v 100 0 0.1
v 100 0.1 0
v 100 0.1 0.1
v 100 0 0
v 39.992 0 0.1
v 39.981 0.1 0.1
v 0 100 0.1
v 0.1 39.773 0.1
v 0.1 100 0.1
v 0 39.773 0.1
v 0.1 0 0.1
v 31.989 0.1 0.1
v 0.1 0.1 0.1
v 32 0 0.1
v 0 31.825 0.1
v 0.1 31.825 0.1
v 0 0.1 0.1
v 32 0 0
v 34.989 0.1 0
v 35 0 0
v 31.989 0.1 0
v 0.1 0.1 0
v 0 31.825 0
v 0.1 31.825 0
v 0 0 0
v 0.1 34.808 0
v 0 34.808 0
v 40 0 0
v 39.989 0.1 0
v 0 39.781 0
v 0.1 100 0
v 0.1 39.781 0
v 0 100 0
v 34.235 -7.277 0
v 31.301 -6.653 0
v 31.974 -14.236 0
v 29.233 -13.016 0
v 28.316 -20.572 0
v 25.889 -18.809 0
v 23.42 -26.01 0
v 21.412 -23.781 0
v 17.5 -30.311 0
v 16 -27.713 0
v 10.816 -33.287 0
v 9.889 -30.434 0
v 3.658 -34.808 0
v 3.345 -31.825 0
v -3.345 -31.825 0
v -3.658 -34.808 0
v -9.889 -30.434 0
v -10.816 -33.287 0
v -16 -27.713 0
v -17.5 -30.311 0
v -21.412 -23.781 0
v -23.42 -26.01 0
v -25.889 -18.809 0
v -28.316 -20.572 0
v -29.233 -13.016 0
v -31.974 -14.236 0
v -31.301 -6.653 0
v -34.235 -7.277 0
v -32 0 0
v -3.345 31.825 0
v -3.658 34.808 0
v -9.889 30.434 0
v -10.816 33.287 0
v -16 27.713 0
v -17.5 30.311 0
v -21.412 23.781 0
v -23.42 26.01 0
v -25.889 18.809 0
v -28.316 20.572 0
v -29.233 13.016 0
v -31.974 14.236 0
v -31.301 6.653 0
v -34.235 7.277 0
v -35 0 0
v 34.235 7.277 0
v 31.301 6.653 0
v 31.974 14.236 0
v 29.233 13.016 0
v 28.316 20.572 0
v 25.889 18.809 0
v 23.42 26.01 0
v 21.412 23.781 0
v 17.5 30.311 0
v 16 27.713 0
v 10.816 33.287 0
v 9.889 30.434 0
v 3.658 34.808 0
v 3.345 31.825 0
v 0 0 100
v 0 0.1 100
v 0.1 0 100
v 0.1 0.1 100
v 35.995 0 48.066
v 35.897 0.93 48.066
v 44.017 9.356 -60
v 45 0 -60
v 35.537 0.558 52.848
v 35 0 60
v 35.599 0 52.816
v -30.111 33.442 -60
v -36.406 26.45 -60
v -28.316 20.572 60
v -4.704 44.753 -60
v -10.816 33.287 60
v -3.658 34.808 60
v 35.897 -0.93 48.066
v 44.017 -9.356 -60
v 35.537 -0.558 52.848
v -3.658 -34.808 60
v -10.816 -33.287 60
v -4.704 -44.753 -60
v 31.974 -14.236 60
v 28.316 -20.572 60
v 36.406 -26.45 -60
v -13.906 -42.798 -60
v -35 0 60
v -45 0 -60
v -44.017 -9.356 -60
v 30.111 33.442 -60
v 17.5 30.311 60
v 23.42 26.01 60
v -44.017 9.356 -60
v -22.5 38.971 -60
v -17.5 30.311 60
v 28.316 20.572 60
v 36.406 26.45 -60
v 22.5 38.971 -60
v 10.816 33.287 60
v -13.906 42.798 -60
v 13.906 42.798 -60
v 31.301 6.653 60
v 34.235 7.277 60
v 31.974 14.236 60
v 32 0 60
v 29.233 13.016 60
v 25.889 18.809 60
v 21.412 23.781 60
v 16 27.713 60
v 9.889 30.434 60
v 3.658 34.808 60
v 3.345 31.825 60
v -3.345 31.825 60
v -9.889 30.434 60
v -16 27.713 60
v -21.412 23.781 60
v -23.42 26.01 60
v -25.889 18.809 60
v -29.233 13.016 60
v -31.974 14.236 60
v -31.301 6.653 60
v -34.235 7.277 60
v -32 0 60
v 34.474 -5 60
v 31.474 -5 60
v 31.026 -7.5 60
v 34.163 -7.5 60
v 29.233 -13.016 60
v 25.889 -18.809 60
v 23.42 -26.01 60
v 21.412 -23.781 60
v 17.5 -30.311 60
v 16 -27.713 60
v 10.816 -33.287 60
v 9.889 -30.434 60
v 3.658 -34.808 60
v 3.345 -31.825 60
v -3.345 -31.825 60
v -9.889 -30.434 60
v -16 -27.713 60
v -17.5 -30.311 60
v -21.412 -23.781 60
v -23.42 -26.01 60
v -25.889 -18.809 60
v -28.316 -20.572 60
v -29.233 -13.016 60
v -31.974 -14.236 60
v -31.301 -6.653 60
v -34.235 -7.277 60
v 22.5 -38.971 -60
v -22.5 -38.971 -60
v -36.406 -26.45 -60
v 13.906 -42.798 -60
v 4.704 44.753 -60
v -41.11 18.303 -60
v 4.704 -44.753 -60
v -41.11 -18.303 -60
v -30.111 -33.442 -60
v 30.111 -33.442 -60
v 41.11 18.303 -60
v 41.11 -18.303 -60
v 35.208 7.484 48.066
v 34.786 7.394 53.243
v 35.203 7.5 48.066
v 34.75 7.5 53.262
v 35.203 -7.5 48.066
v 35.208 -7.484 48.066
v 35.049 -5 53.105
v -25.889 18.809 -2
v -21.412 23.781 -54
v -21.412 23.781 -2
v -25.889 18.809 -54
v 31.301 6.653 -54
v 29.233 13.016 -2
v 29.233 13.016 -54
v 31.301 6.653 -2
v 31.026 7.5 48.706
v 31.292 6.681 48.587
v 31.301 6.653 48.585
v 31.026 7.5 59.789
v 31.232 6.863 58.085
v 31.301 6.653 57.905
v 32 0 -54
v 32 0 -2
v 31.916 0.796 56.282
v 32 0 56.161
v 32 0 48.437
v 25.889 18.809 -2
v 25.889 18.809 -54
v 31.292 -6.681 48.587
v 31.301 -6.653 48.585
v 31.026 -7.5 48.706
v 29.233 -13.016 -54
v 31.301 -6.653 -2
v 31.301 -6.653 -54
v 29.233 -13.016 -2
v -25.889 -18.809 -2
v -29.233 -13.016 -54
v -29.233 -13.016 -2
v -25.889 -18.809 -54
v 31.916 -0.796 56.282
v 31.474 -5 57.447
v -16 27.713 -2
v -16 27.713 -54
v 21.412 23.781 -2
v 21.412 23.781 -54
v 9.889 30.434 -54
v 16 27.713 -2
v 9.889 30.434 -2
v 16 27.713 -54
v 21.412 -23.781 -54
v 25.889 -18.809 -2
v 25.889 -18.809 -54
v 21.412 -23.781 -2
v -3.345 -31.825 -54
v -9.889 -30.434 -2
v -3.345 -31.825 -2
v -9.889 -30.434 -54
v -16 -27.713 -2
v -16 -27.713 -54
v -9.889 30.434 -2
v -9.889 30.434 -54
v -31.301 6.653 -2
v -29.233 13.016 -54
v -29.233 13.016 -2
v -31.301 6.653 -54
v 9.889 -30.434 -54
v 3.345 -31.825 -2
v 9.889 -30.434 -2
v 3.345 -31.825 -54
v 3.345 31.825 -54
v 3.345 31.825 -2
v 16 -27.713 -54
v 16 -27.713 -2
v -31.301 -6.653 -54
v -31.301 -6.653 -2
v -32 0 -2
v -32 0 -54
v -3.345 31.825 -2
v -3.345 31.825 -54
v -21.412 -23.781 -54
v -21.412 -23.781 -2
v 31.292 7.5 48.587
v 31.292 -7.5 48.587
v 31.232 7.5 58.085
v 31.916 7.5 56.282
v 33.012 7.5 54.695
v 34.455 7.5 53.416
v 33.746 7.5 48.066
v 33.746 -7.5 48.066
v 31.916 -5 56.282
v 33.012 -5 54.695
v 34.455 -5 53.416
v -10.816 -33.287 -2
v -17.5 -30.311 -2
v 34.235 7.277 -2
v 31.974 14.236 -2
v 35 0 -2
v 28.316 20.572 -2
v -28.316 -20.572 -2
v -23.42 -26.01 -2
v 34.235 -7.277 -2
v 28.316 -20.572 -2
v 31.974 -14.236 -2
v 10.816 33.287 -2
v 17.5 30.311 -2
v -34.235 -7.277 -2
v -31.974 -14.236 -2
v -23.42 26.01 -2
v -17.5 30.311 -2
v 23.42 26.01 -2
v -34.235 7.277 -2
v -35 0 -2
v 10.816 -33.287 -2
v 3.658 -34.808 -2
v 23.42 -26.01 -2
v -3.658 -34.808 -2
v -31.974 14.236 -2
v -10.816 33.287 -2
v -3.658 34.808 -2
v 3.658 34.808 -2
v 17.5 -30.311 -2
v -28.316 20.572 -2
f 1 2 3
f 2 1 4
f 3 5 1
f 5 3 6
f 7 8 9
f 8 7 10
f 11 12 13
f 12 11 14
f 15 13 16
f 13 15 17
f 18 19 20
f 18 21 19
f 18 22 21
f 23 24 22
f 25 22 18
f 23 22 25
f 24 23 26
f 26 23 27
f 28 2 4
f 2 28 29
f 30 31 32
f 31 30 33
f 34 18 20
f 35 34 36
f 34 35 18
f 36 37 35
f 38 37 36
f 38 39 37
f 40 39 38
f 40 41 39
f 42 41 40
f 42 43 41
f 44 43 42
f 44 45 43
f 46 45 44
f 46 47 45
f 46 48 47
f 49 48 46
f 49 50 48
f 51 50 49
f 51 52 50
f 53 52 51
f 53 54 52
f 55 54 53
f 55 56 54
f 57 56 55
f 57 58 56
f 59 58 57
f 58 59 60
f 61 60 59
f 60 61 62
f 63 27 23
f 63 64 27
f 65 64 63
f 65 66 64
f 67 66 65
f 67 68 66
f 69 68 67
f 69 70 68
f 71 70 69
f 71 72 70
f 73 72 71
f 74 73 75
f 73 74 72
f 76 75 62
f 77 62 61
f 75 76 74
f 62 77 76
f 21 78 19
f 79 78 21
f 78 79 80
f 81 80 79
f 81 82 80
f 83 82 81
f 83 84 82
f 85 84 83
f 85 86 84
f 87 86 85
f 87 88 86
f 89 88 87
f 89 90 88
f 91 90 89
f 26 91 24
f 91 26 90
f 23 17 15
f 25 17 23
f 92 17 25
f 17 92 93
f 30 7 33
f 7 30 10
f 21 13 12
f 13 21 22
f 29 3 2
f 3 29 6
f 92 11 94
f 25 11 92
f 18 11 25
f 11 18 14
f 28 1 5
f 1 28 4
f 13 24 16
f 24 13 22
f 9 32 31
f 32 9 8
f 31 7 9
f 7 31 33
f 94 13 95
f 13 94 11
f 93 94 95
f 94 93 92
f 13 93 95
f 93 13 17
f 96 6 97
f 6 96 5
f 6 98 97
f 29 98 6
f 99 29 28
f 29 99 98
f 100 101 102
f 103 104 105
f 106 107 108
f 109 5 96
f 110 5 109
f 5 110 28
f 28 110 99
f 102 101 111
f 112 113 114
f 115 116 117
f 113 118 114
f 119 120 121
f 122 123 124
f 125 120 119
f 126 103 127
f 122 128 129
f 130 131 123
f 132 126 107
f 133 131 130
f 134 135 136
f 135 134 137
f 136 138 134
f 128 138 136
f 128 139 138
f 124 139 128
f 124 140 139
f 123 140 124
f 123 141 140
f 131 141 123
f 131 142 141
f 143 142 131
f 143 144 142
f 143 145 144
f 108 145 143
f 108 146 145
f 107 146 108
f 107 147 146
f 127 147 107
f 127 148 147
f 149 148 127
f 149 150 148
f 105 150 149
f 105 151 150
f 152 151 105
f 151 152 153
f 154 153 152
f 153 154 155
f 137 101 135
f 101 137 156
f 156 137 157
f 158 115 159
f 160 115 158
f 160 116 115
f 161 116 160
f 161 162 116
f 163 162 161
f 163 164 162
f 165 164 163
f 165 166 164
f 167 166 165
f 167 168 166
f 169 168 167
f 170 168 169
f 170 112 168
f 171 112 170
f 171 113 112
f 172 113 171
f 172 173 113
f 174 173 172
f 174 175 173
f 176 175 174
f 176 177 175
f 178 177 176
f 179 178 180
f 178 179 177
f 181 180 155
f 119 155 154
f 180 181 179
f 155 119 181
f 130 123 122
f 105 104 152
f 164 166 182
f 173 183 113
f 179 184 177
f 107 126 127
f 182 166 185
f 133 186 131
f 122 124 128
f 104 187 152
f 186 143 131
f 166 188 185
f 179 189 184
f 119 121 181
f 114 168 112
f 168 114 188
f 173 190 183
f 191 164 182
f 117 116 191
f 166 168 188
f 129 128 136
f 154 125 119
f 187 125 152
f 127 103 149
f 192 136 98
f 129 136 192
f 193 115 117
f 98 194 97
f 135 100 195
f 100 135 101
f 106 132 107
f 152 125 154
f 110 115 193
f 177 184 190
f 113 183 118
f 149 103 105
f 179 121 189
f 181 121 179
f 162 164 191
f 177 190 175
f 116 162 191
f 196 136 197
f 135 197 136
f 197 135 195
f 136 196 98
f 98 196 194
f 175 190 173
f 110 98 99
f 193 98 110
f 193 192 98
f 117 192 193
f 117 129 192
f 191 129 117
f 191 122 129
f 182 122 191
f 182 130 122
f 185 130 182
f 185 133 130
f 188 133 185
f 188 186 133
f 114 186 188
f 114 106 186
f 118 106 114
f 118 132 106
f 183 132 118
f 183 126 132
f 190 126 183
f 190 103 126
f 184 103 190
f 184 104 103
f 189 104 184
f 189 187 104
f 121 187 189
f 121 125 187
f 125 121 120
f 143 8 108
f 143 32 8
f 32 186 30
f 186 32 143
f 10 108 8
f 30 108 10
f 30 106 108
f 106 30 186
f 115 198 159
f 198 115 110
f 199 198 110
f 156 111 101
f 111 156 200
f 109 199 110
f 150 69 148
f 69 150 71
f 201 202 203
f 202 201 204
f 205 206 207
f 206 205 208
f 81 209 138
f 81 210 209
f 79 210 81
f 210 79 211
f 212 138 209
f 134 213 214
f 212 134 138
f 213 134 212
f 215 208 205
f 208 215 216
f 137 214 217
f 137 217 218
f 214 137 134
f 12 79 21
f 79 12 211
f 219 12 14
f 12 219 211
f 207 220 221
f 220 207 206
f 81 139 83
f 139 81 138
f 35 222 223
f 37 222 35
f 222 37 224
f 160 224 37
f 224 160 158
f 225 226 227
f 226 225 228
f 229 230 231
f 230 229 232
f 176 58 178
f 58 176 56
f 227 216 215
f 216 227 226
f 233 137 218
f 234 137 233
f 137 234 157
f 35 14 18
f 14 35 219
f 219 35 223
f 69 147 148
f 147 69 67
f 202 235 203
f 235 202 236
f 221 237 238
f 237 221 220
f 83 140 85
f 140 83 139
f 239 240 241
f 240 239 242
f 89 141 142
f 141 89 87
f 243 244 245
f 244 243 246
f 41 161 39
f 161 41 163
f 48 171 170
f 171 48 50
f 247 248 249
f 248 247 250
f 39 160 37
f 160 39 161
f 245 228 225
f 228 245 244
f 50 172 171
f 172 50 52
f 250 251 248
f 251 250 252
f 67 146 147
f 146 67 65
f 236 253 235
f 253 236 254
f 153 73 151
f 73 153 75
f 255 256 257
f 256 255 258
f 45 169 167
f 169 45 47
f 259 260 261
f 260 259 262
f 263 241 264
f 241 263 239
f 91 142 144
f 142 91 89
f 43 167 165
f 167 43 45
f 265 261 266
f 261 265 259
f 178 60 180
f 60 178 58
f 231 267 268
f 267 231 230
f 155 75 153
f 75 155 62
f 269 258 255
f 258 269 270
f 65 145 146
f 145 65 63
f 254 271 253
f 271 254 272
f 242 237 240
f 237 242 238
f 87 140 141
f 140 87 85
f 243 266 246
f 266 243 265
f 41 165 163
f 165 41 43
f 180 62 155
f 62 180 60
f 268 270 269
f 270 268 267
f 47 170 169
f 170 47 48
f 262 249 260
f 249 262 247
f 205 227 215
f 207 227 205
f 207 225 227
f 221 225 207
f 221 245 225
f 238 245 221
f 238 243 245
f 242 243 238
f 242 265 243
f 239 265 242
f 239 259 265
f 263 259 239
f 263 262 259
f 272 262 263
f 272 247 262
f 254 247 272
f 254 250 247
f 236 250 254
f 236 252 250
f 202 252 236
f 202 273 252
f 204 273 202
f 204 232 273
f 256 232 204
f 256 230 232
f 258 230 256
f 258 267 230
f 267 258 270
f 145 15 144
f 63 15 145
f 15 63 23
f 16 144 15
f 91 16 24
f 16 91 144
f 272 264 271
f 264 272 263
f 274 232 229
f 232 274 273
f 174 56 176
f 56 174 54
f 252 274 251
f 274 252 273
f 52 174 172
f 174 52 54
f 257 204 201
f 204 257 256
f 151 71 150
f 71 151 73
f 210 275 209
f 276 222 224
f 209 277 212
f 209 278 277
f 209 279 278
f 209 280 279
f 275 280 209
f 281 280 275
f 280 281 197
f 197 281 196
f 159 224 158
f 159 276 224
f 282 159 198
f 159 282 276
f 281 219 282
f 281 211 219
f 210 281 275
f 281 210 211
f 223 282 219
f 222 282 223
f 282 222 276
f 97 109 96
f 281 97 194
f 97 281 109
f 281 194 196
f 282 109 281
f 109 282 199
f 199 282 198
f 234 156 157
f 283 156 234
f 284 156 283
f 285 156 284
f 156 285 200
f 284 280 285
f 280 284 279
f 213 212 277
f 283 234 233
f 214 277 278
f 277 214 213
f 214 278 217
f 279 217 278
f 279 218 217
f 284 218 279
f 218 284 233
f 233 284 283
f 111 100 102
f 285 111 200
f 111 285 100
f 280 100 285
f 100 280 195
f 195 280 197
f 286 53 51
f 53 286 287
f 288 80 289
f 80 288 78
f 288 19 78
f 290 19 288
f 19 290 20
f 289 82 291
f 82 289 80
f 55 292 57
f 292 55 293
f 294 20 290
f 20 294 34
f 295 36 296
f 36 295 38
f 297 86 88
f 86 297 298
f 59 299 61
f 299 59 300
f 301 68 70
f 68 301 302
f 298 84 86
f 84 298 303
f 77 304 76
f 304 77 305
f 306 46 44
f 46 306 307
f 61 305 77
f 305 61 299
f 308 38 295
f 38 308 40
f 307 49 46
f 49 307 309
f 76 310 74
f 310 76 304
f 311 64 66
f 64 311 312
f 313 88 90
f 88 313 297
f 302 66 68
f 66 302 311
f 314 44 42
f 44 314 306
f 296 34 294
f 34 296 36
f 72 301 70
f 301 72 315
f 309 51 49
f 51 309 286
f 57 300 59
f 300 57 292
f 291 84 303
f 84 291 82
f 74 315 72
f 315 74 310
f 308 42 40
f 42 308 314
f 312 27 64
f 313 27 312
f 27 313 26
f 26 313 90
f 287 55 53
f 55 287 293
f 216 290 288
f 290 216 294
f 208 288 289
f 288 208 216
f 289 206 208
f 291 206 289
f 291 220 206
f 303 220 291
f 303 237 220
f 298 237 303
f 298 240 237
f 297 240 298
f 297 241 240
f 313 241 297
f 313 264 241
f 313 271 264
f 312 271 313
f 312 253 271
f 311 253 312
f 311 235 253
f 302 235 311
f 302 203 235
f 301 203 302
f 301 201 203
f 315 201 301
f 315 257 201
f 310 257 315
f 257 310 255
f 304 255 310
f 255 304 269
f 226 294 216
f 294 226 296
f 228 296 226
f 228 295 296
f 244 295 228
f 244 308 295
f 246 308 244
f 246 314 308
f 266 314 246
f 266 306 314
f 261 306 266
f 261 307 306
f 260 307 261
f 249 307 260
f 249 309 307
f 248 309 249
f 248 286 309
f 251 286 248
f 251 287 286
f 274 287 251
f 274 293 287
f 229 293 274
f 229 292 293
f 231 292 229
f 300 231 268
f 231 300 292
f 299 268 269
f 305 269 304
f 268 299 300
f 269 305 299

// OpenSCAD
    // Combined Scene

    // Permanent Model
    
    // Permanent Model (Black)
    color([0, 0, 0]) {
        // Your permanent model code here
        cube([100,0.1,0.1], center = false);
        cube([0.1,100,0.1], center = false);
        cube([0.1,0.1,100], center = false);
    }
    

    // Dynamic Model
    difference() {
    // Main mug body
    difference() {
        // Outer shape with a wider top and narrower bottom
        cylinder(h=120, r1=45, r2=35, center=true);
        // Inner hollow space for fluid containment with 3 mm wall thickness
        translate([0, 0, 3])
            cylinder(h=114, r=32, center=true);
    }

    // Handle of the mug
    translate([45, 0, 60])
        rotate([90, 0, 0])
            difference() {
                // Outer part of handle
                translate([-10, 0, 0])
                    scale([1, 1, 0.5])
                        cylinder(h=30, r=12, center=true);
                // Inner cutout of handle
                translate([-6, 0, -5])
                    scale([1, 1, 0.5])
                        cylinder(h=40, r=8, center=true);
            }

    // Rounded base for stability
    translate([0, 0, -2])
        cylinder(h=2, r=35);

    // Flared rim for comfort
    translate([0, 0, 120])
        cylinder(h=5, r1=48, r2=35, center=true);
    
    // Texturing for grip
    for (i = [0:8]) {
        rotate(i * 45)
            translate([25, 0, 0])
                linear_extrude(height=120)
                    offset(r=0.5)
                        polygon(points=[[0, -2], [0, 2], [1, 2], [1, -2]]);
    }
}
    
